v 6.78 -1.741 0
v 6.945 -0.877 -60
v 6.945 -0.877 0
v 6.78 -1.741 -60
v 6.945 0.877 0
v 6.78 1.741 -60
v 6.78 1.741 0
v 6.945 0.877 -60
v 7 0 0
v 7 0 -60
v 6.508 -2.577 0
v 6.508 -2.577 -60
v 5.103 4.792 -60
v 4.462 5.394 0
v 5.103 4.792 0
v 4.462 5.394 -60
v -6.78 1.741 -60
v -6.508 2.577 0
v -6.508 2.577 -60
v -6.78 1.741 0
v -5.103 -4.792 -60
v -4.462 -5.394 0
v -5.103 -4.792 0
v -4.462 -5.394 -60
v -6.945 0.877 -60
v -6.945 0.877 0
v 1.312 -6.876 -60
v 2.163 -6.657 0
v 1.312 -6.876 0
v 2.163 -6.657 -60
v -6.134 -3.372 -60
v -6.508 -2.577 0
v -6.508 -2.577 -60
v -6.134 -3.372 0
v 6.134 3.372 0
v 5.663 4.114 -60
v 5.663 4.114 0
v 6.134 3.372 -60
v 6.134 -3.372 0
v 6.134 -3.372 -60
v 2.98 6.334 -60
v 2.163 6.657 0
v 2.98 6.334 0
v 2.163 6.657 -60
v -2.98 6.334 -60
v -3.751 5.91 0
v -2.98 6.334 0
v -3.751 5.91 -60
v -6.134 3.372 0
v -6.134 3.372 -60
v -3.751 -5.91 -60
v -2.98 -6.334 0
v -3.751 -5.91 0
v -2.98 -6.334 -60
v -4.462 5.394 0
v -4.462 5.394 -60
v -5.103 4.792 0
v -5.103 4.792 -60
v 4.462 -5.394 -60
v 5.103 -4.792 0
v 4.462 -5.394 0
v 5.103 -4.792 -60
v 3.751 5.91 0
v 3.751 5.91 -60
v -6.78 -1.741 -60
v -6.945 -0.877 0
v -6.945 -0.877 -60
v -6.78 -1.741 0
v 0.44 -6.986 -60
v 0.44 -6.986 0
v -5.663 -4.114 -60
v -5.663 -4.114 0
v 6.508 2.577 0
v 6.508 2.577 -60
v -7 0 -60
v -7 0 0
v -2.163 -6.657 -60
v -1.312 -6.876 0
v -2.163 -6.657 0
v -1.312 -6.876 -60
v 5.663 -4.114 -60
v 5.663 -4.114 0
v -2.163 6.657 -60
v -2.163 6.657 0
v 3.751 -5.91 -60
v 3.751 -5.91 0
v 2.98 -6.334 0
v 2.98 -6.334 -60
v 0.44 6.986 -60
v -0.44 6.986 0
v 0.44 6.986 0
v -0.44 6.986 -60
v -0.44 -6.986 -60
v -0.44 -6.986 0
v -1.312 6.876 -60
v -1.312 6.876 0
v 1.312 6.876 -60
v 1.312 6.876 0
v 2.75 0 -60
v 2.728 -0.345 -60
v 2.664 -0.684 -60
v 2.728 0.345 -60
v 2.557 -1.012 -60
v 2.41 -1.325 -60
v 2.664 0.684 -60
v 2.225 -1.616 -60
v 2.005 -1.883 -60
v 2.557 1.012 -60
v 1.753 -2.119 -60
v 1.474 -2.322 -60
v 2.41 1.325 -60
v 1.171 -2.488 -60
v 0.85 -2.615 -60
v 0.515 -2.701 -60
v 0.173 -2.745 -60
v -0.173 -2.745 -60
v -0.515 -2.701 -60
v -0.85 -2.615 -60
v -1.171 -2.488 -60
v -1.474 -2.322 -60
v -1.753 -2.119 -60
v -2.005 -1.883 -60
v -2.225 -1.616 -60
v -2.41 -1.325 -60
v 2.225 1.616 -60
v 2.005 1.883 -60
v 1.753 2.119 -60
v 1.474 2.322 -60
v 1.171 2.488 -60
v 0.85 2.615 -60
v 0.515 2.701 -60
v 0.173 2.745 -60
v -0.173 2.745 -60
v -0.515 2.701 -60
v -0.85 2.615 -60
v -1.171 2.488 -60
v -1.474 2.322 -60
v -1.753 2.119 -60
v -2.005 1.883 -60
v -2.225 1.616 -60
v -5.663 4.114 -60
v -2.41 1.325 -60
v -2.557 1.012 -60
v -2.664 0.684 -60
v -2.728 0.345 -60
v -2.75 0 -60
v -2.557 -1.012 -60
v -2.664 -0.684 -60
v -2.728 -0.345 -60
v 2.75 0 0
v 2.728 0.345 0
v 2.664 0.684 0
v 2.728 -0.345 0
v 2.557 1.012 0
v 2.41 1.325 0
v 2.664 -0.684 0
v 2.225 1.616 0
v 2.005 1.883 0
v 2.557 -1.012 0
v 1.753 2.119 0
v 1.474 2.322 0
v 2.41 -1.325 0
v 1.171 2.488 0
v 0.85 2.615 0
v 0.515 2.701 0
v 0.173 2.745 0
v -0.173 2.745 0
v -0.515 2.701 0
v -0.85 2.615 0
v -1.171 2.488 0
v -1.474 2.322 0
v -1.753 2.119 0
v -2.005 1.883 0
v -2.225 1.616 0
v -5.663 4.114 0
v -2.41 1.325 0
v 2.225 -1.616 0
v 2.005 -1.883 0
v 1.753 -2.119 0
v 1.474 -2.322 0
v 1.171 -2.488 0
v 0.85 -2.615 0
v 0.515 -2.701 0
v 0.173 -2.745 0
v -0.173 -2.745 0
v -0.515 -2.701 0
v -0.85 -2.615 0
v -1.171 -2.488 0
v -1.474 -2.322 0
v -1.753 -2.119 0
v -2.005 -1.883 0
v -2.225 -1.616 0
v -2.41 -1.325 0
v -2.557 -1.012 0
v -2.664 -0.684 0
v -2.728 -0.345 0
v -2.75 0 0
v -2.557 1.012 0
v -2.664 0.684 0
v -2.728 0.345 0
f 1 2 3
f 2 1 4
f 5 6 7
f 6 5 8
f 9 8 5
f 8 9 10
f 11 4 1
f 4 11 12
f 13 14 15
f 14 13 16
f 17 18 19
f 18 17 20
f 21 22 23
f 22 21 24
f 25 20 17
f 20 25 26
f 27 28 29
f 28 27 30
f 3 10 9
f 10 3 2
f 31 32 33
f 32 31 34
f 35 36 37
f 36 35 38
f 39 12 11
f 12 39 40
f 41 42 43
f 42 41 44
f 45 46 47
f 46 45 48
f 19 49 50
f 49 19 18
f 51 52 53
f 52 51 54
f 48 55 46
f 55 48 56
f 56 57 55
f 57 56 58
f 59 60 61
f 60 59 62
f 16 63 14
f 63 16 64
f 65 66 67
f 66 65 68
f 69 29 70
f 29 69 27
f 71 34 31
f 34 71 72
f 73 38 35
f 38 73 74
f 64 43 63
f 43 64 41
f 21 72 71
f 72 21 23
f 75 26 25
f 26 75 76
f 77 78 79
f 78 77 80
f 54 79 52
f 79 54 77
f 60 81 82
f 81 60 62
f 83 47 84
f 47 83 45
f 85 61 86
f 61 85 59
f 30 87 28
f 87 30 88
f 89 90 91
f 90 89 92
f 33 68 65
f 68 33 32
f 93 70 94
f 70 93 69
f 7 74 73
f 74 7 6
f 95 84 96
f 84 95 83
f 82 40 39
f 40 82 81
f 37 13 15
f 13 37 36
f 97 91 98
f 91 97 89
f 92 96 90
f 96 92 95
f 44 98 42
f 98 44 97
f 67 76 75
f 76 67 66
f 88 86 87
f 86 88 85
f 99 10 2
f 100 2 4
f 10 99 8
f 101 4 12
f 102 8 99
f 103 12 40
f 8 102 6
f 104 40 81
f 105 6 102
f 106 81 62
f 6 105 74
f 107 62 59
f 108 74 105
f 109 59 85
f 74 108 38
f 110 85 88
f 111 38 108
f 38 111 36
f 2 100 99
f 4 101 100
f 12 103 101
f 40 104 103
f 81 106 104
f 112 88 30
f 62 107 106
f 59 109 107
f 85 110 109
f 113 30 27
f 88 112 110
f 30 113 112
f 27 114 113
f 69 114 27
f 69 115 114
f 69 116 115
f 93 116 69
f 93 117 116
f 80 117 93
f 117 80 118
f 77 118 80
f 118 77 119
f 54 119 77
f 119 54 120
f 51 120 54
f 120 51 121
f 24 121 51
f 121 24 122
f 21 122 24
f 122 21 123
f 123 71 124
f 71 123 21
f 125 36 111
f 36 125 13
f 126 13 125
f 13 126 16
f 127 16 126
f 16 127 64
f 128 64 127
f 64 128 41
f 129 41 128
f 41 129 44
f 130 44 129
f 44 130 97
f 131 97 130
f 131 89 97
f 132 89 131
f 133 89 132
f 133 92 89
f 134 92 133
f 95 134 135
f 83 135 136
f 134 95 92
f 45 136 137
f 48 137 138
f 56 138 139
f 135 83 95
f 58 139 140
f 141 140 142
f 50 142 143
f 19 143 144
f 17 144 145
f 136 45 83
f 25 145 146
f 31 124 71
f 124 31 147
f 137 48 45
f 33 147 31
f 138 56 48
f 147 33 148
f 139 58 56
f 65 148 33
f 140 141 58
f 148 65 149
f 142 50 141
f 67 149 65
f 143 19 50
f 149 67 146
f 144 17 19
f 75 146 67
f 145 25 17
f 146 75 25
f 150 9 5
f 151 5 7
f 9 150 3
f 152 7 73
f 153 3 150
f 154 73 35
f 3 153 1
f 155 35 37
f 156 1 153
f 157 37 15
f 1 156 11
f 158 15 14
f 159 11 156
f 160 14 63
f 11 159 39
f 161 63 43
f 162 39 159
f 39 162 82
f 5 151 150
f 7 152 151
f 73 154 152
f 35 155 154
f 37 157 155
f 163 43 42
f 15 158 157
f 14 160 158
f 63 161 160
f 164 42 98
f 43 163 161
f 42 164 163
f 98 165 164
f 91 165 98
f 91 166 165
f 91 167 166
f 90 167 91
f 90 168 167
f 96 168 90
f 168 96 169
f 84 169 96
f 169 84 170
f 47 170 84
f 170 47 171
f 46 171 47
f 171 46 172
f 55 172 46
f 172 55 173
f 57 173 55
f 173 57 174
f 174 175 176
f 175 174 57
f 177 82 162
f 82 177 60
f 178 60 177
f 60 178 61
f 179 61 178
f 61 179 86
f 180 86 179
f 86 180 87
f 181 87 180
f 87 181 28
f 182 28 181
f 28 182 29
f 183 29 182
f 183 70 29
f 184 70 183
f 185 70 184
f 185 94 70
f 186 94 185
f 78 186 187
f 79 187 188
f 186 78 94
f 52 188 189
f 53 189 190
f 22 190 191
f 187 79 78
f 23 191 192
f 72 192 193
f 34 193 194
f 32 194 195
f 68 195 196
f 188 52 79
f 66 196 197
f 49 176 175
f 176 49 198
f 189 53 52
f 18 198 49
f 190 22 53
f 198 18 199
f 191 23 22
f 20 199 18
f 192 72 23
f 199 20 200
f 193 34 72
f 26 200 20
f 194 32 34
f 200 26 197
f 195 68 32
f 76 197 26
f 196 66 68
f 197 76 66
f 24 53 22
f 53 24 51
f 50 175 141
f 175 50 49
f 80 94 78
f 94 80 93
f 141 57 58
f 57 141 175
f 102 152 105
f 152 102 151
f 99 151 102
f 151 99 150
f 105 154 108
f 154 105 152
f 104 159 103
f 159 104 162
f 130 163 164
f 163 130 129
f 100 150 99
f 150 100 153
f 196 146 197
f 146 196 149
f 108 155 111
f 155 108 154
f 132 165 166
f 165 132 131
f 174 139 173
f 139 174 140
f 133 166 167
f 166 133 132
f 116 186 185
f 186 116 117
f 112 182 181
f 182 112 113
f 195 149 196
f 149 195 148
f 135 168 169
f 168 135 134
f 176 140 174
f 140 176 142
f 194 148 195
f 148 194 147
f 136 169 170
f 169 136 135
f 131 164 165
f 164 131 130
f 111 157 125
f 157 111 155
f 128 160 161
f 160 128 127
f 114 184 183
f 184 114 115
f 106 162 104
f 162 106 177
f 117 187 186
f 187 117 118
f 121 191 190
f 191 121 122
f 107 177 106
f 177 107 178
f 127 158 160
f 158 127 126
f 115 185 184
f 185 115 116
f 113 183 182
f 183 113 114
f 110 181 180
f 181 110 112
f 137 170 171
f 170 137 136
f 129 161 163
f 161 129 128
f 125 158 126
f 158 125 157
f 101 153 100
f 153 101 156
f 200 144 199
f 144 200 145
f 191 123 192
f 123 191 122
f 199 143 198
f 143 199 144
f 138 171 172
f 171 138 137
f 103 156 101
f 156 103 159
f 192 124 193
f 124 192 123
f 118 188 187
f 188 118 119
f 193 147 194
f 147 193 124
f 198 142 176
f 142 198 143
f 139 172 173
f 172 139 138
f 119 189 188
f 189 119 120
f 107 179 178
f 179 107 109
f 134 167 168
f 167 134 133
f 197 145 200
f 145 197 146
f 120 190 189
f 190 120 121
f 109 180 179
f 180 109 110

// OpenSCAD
$fn = 50;


difference() {
	union() {
		translate(v = [0, 0, -60.0000000000]) {
			cylinder(h = 60, r = 7.0000000000);
		}
		cylinder(h = 0, r = 13.0000000000);
	}
	union() {
		#translate(v = [0, 0, -60]) {
			cylinder(h = 60, r = 2.7500000000);
		}
	}
}
